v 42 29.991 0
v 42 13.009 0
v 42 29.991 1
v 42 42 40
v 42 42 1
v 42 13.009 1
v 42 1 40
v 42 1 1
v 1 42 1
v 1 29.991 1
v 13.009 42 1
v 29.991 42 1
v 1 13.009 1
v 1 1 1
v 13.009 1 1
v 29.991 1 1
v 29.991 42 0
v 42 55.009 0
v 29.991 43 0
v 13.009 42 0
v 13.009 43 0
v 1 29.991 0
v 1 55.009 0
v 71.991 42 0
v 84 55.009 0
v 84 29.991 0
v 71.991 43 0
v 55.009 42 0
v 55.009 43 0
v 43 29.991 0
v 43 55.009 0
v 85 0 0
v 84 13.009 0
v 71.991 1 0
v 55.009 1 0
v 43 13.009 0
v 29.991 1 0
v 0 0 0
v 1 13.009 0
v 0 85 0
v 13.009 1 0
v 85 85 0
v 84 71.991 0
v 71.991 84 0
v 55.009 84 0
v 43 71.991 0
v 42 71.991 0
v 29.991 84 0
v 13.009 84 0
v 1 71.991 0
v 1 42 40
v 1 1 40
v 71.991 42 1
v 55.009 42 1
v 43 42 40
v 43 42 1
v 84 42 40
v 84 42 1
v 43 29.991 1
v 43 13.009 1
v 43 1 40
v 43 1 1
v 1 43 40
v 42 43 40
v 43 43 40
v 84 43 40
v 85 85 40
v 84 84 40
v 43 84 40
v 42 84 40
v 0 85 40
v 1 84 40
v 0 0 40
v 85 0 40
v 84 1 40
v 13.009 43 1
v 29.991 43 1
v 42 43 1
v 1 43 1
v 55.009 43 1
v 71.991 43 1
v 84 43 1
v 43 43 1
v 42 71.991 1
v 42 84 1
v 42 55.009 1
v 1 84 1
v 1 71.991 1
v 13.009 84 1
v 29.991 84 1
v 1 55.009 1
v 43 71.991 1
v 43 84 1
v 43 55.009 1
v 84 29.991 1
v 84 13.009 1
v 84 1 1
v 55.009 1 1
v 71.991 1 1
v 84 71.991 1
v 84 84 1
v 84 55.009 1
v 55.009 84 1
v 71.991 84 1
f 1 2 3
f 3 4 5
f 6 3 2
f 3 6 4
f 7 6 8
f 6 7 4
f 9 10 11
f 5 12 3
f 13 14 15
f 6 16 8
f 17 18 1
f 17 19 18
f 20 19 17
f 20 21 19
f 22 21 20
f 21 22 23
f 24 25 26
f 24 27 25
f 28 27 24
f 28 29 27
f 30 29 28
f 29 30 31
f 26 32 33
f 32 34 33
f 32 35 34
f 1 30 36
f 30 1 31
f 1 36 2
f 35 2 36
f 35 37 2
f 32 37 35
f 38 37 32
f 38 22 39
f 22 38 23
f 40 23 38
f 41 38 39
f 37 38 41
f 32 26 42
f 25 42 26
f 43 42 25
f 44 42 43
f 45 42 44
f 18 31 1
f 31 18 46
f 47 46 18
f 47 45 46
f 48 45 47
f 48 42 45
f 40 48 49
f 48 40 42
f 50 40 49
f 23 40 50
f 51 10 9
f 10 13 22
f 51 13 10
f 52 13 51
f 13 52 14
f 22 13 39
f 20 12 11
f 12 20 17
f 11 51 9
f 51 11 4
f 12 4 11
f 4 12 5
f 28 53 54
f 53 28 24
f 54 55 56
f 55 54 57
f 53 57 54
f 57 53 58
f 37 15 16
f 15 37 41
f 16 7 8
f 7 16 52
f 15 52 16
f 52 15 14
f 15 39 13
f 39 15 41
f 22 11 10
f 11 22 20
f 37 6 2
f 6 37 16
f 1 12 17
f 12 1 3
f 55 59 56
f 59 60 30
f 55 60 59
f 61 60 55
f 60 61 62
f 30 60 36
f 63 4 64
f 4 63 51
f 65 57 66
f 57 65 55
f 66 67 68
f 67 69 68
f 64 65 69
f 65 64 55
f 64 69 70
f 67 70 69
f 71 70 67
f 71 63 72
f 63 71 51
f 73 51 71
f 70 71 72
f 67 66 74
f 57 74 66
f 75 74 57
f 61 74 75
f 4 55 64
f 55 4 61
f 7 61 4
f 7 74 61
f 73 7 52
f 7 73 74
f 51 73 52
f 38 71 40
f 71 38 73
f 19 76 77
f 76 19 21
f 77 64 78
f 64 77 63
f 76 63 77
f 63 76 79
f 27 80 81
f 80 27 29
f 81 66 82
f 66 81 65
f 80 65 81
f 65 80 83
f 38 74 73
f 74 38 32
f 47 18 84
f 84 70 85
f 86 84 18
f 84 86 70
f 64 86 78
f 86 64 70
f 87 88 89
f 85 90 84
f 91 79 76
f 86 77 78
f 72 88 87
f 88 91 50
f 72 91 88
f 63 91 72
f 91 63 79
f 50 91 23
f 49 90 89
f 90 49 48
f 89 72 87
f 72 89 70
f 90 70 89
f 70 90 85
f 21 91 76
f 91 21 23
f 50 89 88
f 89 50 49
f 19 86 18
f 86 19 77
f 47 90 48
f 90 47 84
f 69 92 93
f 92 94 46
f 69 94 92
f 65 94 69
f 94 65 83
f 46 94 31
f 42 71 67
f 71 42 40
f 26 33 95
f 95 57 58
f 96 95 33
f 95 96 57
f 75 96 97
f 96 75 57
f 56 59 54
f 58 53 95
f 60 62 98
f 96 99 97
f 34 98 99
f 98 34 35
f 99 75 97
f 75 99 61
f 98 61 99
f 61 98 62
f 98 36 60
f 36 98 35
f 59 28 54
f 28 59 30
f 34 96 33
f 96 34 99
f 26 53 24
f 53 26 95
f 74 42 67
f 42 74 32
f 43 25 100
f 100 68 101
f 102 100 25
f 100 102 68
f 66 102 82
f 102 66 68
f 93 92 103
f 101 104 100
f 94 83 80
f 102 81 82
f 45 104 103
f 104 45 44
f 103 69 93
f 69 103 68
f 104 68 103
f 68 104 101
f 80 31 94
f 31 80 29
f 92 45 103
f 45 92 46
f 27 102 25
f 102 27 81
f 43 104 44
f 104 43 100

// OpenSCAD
//Set the number of boxes vertically
i=2; // [1:50]
//Set the number of boxes horizontally
j=2; // [1:50]
//Set the inner box size (in mm)
a=41;
//Set the wall thickness (in mm)
b=1;
//Set the bottom thickness (in mm, not higher than the total height!)
c=1;
//Set the total height of the holder (in mm)
h=40;

for (i =[1:i],j=[1:j]) kostka(a,b,c,h,i,j);

module kostka (a,b,c,h,i,j) {
translate([(i-1)*(a+b),(j-1)*(a+b),0]) union(){
translate([b,b,0]) difference() {
cube([a,a,c],false);
translate([a/2,a*(1-sqrt(2))/2,0]) rotate([0,0,45]) cube([a,a,c],false);
}
difference() {
cube([a+2*b,a+2*b,h],false);
translate([b,b,0]) cube([a,a,2*h],false);
}
}
}
